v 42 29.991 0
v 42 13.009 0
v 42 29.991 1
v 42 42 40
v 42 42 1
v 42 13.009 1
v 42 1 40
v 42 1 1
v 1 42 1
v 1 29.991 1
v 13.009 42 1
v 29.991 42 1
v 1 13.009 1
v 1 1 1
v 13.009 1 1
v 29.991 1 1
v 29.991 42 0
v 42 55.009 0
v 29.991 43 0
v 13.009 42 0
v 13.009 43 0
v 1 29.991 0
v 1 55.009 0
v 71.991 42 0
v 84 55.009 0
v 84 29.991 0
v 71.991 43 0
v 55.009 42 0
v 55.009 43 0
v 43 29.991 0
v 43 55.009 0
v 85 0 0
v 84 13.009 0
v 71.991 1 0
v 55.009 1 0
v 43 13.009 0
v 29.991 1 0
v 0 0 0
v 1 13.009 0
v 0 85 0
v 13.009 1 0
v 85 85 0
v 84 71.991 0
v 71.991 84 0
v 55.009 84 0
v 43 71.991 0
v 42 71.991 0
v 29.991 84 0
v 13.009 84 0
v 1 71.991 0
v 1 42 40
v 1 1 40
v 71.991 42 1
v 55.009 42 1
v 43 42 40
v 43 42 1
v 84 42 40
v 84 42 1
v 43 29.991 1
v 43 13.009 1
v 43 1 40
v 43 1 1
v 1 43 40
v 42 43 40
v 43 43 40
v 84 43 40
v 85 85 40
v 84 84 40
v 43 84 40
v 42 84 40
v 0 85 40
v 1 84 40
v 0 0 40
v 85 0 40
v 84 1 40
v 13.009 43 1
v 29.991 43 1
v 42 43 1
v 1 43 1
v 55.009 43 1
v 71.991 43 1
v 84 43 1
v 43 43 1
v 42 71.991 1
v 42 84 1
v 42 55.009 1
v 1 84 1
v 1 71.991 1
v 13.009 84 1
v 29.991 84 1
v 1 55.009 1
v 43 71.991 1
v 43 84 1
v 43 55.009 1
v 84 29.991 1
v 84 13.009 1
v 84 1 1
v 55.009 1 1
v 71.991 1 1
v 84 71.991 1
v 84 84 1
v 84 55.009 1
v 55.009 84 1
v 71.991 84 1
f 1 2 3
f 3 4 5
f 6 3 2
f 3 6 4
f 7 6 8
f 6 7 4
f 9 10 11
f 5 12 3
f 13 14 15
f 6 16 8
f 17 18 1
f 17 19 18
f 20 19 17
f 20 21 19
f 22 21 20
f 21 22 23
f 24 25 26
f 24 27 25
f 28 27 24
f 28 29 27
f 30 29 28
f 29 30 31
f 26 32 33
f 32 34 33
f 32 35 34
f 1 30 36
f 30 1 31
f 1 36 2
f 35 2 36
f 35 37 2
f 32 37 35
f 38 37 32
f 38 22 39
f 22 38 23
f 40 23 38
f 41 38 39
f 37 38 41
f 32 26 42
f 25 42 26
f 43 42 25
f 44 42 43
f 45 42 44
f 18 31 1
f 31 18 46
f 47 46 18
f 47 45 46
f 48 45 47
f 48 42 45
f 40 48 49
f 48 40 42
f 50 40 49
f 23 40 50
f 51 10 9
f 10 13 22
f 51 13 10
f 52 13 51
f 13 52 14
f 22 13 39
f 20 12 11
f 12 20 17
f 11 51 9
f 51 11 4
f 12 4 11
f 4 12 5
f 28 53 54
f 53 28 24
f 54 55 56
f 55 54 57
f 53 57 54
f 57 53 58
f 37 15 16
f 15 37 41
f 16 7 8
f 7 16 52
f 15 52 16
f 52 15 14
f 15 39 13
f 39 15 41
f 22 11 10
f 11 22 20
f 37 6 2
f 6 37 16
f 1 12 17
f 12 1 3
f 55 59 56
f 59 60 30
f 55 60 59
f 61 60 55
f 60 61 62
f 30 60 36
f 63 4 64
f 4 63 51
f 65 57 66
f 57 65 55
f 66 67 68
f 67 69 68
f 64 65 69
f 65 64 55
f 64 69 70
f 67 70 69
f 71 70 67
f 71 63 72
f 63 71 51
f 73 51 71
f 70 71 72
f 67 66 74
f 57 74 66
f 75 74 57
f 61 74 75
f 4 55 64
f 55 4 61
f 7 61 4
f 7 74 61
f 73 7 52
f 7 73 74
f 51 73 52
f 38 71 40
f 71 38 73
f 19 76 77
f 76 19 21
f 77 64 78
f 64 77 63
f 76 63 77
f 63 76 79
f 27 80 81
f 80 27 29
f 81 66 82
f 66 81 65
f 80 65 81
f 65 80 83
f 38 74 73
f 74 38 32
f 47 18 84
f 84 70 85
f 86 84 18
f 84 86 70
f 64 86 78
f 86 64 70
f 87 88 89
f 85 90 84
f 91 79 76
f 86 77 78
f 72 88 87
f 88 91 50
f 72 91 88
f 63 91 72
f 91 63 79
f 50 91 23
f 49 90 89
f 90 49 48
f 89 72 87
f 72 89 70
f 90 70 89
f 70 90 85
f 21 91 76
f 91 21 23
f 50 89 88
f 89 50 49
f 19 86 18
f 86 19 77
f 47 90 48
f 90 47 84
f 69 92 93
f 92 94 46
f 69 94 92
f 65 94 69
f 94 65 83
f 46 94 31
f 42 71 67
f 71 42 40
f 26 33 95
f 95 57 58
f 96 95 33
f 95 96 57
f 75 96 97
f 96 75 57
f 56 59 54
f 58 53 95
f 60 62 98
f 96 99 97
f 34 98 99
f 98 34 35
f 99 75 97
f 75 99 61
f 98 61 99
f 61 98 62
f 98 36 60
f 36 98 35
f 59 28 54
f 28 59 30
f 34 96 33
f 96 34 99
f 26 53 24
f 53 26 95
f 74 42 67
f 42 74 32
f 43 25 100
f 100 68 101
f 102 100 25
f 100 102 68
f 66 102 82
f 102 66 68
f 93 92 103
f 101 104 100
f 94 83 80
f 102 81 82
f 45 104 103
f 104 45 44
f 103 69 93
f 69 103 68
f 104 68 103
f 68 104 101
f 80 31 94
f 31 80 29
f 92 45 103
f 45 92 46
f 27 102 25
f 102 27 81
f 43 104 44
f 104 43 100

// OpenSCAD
//Set the number of boxes vertically
i=2; // [1:50]
//Set the number of boxes horizontally
j=2; // [1:50]
//Set the inner box size (in mm)
a=41;
//Set the wall thickness (in mm)
b=1;
//Set the bottom thickness (in mm, not higher than the total height!)
c=1;
//Set the total height of the holder (in mm)
h=40;

for (i =[1:i],j=[1:j]) kostka(a,b,c,h,i,j);

module kostka (a,b,c,h,i,j) {
translate([(i-1)*(a+b),(j-1)*(a+b),0]) union(){
translate([b,b,0]) difference() {
cube([a,a,c],false);
translate([a/2,a*(1-sqrt(2))/2,0]) rotate([0,0,45]) cube([a,a,c],false);
}
difference() {
cube([a+2*b,a+2*b,h],false);
translate([b,b,0]) cube([a,a,2*h],false);
}
}
}
